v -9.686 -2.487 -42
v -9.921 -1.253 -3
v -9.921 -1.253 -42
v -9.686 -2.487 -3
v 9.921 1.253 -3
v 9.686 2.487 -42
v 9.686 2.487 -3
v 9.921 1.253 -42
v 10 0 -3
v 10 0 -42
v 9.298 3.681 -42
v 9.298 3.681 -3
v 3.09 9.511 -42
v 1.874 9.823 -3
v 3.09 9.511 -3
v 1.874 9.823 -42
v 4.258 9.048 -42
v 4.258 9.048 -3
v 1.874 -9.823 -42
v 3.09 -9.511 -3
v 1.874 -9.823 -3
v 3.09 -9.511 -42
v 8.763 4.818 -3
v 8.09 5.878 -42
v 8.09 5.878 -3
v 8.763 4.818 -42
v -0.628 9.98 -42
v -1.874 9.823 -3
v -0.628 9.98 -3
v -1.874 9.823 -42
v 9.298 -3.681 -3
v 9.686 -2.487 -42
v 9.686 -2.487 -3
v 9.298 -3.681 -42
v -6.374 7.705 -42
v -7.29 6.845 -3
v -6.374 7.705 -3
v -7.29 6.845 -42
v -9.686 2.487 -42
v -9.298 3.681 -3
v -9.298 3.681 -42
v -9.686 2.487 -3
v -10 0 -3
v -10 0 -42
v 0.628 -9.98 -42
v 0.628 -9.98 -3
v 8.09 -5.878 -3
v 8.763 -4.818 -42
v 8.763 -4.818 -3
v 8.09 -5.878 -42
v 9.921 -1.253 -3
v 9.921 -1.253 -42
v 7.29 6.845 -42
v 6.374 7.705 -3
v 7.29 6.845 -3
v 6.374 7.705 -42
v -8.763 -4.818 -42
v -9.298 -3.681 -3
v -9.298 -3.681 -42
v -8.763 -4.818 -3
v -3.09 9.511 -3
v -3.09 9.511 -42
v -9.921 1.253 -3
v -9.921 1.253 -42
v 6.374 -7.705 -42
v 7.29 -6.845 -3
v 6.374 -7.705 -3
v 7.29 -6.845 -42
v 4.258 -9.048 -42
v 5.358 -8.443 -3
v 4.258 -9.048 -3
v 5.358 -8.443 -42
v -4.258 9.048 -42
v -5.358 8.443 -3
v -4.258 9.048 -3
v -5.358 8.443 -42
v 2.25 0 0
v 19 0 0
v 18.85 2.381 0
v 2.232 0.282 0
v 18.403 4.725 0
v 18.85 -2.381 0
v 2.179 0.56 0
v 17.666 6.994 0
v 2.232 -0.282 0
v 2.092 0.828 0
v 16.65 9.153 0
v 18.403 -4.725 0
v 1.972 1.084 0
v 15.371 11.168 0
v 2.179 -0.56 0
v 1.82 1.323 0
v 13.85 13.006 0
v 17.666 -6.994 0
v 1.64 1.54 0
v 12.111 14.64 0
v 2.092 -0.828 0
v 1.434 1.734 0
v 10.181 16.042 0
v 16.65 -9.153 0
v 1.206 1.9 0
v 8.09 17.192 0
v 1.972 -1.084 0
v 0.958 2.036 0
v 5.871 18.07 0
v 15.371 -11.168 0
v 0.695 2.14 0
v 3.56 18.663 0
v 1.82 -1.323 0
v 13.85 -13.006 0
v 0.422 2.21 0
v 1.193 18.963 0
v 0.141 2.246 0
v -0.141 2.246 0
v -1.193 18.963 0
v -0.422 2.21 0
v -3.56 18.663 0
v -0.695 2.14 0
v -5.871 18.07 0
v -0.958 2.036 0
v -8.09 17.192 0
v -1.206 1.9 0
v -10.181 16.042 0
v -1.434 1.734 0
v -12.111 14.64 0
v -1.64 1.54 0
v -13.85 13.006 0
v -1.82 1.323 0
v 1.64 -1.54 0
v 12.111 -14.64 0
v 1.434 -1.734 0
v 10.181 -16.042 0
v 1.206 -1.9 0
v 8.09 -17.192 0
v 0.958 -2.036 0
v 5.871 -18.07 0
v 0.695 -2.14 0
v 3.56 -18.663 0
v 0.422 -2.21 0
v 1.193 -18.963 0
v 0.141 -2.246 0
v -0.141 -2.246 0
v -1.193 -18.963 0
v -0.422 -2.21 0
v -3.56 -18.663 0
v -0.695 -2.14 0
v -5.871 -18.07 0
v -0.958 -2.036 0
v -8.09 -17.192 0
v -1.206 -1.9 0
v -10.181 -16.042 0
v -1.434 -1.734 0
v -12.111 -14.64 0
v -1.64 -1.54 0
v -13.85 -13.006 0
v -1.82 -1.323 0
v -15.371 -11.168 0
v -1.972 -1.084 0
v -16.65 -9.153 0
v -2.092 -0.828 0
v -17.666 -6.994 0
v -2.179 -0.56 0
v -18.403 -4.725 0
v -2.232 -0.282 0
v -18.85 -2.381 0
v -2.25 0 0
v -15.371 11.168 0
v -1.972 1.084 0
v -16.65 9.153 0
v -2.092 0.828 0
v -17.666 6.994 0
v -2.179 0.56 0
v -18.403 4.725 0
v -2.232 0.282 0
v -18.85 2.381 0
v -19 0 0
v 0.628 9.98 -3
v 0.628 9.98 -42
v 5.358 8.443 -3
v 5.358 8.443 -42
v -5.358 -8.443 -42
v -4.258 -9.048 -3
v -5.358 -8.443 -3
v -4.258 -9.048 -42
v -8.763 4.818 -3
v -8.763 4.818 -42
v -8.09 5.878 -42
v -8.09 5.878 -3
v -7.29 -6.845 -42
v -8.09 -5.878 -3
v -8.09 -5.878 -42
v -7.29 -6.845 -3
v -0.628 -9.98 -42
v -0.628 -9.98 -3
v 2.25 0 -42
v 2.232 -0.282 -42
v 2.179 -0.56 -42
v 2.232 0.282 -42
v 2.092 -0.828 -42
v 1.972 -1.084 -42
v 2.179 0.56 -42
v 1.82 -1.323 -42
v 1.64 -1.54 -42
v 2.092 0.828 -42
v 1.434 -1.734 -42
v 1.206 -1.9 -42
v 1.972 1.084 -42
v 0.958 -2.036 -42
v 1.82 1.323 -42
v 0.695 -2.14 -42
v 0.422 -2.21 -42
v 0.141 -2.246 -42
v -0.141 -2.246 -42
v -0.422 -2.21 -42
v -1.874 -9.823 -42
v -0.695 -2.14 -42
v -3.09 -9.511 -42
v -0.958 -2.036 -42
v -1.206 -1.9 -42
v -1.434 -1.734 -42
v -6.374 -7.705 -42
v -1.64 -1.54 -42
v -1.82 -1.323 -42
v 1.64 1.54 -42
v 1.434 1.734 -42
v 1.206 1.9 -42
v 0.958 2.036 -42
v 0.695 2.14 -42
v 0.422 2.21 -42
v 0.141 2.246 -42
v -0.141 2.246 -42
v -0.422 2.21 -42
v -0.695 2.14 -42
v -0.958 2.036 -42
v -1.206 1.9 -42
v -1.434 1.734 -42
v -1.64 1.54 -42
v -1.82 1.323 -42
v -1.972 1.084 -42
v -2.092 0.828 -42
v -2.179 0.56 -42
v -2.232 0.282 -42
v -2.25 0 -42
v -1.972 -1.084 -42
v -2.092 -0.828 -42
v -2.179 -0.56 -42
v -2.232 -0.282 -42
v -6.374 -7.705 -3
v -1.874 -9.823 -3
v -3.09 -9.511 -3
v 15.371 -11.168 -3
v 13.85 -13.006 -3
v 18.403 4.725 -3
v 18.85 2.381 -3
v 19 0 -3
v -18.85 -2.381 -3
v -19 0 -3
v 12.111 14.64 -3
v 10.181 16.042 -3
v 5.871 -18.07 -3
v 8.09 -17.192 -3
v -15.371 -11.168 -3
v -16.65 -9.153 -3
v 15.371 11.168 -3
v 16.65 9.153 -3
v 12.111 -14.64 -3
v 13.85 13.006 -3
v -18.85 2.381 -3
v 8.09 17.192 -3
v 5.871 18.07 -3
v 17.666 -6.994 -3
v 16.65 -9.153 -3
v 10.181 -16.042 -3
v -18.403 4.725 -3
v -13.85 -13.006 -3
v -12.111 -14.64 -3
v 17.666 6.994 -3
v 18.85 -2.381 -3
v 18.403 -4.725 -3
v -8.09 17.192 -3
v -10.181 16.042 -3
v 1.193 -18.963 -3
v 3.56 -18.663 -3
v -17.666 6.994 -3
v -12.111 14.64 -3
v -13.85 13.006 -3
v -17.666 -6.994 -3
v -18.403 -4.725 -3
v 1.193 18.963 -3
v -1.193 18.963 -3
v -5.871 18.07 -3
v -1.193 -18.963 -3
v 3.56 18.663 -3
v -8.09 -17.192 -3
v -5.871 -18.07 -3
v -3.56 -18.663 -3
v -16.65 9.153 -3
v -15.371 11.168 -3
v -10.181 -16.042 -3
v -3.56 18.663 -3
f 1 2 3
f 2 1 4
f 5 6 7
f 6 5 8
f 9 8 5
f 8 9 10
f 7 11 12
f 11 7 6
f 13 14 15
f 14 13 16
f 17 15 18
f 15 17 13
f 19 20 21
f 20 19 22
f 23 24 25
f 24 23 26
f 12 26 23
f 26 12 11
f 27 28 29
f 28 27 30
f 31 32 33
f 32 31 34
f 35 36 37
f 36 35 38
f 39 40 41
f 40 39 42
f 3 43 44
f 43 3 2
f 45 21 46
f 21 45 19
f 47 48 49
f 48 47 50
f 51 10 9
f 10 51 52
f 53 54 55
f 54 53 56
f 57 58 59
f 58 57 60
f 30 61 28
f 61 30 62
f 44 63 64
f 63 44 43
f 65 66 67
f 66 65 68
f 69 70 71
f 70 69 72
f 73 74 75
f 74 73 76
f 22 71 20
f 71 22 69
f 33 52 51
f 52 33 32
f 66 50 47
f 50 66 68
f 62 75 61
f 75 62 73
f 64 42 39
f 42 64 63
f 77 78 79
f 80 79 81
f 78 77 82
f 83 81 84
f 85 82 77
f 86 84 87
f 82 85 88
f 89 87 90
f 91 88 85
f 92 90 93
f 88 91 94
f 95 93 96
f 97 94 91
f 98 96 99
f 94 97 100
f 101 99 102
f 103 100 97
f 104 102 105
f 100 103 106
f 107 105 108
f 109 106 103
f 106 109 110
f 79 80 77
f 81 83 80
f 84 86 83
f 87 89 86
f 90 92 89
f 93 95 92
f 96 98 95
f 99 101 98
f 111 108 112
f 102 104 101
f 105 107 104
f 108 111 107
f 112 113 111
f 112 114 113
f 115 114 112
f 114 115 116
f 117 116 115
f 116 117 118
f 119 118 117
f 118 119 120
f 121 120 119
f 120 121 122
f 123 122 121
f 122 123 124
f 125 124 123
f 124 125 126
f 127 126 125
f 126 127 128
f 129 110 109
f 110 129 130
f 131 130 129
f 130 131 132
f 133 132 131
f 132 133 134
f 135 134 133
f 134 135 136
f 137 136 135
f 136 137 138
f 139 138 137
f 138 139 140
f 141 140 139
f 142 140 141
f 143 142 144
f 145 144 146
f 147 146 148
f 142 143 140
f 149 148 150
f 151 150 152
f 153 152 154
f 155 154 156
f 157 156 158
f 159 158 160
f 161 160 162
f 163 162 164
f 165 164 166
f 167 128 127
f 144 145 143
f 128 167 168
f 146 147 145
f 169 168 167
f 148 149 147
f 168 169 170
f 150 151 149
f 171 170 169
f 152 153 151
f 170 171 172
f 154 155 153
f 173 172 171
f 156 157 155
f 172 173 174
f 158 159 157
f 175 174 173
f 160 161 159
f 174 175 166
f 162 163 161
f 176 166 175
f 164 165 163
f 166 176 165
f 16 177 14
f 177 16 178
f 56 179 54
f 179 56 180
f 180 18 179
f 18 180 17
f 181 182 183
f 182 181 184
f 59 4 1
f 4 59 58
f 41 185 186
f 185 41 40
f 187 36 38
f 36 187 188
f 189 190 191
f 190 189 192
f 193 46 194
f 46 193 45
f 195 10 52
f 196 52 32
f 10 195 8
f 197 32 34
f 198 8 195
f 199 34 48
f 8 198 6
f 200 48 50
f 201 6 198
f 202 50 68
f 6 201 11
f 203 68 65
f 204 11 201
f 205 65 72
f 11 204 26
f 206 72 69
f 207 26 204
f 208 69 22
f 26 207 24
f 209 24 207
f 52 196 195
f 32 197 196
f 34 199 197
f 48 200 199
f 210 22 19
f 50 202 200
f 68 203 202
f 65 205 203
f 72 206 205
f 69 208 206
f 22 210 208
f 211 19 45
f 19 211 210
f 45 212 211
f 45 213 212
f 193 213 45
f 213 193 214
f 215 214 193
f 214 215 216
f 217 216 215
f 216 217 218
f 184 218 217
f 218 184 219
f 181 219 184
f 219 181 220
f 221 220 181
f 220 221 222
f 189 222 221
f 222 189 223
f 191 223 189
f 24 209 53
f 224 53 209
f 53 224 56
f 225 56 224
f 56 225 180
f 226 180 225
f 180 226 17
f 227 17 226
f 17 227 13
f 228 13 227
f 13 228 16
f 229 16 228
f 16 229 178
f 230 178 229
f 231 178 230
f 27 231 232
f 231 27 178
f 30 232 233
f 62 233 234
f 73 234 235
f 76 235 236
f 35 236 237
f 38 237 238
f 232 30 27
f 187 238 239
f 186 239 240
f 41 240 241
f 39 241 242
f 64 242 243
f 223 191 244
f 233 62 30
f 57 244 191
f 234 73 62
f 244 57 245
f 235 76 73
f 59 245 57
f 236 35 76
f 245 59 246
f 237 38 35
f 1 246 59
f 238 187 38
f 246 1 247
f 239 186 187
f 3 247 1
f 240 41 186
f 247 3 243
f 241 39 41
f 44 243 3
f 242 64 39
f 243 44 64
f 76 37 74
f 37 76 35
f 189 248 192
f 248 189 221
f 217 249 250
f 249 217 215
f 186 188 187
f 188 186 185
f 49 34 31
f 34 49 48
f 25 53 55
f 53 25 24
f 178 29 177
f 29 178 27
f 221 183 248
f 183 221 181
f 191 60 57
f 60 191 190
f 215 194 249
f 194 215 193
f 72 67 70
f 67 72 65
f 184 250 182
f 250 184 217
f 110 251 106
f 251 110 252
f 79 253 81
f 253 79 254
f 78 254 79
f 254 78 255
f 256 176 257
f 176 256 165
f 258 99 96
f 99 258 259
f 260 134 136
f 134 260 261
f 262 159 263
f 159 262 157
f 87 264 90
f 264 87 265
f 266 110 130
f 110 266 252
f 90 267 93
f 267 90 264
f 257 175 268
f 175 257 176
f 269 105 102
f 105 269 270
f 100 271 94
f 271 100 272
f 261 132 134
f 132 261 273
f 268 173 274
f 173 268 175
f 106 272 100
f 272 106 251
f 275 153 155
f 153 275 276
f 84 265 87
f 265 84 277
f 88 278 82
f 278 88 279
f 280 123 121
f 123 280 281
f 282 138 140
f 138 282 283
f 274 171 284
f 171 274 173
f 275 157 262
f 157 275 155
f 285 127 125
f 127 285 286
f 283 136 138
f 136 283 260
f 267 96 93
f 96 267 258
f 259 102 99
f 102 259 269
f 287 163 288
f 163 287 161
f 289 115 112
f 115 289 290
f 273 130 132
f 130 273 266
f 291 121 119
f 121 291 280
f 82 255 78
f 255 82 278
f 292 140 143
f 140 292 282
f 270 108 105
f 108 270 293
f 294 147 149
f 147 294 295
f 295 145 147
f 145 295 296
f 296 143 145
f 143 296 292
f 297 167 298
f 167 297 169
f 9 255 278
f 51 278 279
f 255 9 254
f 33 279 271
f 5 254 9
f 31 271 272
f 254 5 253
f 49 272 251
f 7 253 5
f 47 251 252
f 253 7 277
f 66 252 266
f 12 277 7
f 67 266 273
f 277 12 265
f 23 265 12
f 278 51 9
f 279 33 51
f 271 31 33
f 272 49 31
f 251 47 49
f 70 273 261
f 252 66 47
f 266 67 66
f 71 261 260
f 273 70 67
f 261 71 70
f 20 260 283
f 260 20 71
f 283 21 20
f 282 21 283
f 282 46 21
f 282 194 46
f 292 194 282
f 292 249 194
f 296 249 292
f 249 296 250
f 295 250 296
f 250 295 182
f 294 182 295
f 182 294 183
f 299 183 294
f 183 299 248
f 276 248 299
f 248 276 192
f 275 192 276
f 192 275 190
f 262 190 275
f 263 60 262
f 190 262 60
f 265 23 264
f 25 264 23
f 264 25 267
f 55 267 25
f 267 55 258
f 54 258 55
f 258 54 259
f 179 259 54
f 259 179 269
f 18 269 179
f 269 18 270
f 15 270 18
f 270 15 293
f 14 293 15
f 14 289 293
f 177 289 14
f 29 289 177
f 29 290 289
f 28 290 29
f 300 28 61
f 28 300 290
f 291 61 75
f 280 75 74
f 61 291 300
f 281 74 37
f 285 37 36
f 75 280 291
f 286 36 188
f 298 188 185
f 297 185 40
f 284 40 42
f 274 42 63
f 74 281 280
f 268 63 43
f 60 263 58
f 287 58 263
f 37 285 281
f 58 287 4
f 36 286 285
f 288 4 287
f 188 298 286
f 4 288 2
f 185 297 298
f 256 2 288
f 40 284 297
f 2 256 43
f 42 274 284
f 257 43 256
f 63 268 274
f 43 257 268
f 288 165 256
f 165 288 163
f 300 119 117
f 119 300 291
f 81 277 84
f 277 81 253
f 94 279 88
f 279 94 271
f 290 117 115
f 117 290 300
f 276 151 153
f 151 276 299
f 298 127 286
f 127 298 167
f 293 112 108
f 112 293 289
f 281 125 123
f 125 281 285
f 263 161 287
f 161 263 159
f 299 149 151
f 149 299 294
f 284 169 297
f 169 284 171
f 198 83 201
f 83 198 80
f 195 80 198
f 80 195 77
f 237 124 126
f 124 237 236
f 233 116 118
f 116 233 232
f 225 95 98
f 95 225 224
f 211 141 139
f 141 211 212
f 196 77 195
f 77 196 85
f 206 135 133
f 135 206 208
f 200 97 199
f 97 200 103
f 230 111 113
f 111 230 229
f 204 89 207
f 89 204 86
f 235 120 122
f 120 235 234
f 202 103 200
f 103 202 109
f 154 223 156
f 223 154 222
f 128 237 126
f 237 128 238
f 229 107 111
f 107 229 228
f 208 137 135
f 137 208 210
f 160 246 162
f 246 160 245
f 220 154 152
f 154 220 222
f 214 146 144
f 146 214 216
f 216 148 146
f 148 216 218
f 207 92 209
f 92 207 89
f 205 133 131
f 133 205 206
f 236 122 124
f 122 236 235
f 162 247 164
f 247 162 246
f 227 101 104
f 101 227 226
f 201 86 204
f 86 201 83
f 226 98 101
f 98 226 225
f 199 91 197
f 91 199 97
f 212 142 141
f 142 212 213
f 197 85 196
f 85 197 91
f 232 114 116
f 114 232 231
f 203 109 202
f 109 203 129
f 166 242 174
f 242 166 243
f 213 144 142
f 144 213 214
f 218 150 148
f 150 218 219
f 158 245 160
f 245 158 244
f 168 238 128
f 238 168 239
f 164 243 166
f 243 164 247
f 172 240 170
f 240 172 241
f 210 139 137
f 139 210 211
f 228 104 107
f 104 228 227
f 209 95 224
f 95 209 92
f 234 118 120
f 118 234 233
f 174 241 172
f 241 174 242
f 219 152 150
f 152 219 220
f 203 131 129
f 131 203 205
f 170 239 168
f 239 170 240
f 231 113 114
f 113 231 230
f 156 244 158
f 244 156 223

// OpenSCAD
$fn = 50;


difference() {
	union() {
		translate(v = [0, 0, -42.0000000000]) {
			cylinder(h = 42, r = 10.0000000000);
		}
		translate(v = [0, 0, -3.0000000000]) {
			cylinder(h = 3, r = 19.0000000000);
		}
	}
	union() {
		#translate(v = [0, 0, -42]) {
			cylinder(h = 42, r = 2.2500000000);
		}
	}
}
